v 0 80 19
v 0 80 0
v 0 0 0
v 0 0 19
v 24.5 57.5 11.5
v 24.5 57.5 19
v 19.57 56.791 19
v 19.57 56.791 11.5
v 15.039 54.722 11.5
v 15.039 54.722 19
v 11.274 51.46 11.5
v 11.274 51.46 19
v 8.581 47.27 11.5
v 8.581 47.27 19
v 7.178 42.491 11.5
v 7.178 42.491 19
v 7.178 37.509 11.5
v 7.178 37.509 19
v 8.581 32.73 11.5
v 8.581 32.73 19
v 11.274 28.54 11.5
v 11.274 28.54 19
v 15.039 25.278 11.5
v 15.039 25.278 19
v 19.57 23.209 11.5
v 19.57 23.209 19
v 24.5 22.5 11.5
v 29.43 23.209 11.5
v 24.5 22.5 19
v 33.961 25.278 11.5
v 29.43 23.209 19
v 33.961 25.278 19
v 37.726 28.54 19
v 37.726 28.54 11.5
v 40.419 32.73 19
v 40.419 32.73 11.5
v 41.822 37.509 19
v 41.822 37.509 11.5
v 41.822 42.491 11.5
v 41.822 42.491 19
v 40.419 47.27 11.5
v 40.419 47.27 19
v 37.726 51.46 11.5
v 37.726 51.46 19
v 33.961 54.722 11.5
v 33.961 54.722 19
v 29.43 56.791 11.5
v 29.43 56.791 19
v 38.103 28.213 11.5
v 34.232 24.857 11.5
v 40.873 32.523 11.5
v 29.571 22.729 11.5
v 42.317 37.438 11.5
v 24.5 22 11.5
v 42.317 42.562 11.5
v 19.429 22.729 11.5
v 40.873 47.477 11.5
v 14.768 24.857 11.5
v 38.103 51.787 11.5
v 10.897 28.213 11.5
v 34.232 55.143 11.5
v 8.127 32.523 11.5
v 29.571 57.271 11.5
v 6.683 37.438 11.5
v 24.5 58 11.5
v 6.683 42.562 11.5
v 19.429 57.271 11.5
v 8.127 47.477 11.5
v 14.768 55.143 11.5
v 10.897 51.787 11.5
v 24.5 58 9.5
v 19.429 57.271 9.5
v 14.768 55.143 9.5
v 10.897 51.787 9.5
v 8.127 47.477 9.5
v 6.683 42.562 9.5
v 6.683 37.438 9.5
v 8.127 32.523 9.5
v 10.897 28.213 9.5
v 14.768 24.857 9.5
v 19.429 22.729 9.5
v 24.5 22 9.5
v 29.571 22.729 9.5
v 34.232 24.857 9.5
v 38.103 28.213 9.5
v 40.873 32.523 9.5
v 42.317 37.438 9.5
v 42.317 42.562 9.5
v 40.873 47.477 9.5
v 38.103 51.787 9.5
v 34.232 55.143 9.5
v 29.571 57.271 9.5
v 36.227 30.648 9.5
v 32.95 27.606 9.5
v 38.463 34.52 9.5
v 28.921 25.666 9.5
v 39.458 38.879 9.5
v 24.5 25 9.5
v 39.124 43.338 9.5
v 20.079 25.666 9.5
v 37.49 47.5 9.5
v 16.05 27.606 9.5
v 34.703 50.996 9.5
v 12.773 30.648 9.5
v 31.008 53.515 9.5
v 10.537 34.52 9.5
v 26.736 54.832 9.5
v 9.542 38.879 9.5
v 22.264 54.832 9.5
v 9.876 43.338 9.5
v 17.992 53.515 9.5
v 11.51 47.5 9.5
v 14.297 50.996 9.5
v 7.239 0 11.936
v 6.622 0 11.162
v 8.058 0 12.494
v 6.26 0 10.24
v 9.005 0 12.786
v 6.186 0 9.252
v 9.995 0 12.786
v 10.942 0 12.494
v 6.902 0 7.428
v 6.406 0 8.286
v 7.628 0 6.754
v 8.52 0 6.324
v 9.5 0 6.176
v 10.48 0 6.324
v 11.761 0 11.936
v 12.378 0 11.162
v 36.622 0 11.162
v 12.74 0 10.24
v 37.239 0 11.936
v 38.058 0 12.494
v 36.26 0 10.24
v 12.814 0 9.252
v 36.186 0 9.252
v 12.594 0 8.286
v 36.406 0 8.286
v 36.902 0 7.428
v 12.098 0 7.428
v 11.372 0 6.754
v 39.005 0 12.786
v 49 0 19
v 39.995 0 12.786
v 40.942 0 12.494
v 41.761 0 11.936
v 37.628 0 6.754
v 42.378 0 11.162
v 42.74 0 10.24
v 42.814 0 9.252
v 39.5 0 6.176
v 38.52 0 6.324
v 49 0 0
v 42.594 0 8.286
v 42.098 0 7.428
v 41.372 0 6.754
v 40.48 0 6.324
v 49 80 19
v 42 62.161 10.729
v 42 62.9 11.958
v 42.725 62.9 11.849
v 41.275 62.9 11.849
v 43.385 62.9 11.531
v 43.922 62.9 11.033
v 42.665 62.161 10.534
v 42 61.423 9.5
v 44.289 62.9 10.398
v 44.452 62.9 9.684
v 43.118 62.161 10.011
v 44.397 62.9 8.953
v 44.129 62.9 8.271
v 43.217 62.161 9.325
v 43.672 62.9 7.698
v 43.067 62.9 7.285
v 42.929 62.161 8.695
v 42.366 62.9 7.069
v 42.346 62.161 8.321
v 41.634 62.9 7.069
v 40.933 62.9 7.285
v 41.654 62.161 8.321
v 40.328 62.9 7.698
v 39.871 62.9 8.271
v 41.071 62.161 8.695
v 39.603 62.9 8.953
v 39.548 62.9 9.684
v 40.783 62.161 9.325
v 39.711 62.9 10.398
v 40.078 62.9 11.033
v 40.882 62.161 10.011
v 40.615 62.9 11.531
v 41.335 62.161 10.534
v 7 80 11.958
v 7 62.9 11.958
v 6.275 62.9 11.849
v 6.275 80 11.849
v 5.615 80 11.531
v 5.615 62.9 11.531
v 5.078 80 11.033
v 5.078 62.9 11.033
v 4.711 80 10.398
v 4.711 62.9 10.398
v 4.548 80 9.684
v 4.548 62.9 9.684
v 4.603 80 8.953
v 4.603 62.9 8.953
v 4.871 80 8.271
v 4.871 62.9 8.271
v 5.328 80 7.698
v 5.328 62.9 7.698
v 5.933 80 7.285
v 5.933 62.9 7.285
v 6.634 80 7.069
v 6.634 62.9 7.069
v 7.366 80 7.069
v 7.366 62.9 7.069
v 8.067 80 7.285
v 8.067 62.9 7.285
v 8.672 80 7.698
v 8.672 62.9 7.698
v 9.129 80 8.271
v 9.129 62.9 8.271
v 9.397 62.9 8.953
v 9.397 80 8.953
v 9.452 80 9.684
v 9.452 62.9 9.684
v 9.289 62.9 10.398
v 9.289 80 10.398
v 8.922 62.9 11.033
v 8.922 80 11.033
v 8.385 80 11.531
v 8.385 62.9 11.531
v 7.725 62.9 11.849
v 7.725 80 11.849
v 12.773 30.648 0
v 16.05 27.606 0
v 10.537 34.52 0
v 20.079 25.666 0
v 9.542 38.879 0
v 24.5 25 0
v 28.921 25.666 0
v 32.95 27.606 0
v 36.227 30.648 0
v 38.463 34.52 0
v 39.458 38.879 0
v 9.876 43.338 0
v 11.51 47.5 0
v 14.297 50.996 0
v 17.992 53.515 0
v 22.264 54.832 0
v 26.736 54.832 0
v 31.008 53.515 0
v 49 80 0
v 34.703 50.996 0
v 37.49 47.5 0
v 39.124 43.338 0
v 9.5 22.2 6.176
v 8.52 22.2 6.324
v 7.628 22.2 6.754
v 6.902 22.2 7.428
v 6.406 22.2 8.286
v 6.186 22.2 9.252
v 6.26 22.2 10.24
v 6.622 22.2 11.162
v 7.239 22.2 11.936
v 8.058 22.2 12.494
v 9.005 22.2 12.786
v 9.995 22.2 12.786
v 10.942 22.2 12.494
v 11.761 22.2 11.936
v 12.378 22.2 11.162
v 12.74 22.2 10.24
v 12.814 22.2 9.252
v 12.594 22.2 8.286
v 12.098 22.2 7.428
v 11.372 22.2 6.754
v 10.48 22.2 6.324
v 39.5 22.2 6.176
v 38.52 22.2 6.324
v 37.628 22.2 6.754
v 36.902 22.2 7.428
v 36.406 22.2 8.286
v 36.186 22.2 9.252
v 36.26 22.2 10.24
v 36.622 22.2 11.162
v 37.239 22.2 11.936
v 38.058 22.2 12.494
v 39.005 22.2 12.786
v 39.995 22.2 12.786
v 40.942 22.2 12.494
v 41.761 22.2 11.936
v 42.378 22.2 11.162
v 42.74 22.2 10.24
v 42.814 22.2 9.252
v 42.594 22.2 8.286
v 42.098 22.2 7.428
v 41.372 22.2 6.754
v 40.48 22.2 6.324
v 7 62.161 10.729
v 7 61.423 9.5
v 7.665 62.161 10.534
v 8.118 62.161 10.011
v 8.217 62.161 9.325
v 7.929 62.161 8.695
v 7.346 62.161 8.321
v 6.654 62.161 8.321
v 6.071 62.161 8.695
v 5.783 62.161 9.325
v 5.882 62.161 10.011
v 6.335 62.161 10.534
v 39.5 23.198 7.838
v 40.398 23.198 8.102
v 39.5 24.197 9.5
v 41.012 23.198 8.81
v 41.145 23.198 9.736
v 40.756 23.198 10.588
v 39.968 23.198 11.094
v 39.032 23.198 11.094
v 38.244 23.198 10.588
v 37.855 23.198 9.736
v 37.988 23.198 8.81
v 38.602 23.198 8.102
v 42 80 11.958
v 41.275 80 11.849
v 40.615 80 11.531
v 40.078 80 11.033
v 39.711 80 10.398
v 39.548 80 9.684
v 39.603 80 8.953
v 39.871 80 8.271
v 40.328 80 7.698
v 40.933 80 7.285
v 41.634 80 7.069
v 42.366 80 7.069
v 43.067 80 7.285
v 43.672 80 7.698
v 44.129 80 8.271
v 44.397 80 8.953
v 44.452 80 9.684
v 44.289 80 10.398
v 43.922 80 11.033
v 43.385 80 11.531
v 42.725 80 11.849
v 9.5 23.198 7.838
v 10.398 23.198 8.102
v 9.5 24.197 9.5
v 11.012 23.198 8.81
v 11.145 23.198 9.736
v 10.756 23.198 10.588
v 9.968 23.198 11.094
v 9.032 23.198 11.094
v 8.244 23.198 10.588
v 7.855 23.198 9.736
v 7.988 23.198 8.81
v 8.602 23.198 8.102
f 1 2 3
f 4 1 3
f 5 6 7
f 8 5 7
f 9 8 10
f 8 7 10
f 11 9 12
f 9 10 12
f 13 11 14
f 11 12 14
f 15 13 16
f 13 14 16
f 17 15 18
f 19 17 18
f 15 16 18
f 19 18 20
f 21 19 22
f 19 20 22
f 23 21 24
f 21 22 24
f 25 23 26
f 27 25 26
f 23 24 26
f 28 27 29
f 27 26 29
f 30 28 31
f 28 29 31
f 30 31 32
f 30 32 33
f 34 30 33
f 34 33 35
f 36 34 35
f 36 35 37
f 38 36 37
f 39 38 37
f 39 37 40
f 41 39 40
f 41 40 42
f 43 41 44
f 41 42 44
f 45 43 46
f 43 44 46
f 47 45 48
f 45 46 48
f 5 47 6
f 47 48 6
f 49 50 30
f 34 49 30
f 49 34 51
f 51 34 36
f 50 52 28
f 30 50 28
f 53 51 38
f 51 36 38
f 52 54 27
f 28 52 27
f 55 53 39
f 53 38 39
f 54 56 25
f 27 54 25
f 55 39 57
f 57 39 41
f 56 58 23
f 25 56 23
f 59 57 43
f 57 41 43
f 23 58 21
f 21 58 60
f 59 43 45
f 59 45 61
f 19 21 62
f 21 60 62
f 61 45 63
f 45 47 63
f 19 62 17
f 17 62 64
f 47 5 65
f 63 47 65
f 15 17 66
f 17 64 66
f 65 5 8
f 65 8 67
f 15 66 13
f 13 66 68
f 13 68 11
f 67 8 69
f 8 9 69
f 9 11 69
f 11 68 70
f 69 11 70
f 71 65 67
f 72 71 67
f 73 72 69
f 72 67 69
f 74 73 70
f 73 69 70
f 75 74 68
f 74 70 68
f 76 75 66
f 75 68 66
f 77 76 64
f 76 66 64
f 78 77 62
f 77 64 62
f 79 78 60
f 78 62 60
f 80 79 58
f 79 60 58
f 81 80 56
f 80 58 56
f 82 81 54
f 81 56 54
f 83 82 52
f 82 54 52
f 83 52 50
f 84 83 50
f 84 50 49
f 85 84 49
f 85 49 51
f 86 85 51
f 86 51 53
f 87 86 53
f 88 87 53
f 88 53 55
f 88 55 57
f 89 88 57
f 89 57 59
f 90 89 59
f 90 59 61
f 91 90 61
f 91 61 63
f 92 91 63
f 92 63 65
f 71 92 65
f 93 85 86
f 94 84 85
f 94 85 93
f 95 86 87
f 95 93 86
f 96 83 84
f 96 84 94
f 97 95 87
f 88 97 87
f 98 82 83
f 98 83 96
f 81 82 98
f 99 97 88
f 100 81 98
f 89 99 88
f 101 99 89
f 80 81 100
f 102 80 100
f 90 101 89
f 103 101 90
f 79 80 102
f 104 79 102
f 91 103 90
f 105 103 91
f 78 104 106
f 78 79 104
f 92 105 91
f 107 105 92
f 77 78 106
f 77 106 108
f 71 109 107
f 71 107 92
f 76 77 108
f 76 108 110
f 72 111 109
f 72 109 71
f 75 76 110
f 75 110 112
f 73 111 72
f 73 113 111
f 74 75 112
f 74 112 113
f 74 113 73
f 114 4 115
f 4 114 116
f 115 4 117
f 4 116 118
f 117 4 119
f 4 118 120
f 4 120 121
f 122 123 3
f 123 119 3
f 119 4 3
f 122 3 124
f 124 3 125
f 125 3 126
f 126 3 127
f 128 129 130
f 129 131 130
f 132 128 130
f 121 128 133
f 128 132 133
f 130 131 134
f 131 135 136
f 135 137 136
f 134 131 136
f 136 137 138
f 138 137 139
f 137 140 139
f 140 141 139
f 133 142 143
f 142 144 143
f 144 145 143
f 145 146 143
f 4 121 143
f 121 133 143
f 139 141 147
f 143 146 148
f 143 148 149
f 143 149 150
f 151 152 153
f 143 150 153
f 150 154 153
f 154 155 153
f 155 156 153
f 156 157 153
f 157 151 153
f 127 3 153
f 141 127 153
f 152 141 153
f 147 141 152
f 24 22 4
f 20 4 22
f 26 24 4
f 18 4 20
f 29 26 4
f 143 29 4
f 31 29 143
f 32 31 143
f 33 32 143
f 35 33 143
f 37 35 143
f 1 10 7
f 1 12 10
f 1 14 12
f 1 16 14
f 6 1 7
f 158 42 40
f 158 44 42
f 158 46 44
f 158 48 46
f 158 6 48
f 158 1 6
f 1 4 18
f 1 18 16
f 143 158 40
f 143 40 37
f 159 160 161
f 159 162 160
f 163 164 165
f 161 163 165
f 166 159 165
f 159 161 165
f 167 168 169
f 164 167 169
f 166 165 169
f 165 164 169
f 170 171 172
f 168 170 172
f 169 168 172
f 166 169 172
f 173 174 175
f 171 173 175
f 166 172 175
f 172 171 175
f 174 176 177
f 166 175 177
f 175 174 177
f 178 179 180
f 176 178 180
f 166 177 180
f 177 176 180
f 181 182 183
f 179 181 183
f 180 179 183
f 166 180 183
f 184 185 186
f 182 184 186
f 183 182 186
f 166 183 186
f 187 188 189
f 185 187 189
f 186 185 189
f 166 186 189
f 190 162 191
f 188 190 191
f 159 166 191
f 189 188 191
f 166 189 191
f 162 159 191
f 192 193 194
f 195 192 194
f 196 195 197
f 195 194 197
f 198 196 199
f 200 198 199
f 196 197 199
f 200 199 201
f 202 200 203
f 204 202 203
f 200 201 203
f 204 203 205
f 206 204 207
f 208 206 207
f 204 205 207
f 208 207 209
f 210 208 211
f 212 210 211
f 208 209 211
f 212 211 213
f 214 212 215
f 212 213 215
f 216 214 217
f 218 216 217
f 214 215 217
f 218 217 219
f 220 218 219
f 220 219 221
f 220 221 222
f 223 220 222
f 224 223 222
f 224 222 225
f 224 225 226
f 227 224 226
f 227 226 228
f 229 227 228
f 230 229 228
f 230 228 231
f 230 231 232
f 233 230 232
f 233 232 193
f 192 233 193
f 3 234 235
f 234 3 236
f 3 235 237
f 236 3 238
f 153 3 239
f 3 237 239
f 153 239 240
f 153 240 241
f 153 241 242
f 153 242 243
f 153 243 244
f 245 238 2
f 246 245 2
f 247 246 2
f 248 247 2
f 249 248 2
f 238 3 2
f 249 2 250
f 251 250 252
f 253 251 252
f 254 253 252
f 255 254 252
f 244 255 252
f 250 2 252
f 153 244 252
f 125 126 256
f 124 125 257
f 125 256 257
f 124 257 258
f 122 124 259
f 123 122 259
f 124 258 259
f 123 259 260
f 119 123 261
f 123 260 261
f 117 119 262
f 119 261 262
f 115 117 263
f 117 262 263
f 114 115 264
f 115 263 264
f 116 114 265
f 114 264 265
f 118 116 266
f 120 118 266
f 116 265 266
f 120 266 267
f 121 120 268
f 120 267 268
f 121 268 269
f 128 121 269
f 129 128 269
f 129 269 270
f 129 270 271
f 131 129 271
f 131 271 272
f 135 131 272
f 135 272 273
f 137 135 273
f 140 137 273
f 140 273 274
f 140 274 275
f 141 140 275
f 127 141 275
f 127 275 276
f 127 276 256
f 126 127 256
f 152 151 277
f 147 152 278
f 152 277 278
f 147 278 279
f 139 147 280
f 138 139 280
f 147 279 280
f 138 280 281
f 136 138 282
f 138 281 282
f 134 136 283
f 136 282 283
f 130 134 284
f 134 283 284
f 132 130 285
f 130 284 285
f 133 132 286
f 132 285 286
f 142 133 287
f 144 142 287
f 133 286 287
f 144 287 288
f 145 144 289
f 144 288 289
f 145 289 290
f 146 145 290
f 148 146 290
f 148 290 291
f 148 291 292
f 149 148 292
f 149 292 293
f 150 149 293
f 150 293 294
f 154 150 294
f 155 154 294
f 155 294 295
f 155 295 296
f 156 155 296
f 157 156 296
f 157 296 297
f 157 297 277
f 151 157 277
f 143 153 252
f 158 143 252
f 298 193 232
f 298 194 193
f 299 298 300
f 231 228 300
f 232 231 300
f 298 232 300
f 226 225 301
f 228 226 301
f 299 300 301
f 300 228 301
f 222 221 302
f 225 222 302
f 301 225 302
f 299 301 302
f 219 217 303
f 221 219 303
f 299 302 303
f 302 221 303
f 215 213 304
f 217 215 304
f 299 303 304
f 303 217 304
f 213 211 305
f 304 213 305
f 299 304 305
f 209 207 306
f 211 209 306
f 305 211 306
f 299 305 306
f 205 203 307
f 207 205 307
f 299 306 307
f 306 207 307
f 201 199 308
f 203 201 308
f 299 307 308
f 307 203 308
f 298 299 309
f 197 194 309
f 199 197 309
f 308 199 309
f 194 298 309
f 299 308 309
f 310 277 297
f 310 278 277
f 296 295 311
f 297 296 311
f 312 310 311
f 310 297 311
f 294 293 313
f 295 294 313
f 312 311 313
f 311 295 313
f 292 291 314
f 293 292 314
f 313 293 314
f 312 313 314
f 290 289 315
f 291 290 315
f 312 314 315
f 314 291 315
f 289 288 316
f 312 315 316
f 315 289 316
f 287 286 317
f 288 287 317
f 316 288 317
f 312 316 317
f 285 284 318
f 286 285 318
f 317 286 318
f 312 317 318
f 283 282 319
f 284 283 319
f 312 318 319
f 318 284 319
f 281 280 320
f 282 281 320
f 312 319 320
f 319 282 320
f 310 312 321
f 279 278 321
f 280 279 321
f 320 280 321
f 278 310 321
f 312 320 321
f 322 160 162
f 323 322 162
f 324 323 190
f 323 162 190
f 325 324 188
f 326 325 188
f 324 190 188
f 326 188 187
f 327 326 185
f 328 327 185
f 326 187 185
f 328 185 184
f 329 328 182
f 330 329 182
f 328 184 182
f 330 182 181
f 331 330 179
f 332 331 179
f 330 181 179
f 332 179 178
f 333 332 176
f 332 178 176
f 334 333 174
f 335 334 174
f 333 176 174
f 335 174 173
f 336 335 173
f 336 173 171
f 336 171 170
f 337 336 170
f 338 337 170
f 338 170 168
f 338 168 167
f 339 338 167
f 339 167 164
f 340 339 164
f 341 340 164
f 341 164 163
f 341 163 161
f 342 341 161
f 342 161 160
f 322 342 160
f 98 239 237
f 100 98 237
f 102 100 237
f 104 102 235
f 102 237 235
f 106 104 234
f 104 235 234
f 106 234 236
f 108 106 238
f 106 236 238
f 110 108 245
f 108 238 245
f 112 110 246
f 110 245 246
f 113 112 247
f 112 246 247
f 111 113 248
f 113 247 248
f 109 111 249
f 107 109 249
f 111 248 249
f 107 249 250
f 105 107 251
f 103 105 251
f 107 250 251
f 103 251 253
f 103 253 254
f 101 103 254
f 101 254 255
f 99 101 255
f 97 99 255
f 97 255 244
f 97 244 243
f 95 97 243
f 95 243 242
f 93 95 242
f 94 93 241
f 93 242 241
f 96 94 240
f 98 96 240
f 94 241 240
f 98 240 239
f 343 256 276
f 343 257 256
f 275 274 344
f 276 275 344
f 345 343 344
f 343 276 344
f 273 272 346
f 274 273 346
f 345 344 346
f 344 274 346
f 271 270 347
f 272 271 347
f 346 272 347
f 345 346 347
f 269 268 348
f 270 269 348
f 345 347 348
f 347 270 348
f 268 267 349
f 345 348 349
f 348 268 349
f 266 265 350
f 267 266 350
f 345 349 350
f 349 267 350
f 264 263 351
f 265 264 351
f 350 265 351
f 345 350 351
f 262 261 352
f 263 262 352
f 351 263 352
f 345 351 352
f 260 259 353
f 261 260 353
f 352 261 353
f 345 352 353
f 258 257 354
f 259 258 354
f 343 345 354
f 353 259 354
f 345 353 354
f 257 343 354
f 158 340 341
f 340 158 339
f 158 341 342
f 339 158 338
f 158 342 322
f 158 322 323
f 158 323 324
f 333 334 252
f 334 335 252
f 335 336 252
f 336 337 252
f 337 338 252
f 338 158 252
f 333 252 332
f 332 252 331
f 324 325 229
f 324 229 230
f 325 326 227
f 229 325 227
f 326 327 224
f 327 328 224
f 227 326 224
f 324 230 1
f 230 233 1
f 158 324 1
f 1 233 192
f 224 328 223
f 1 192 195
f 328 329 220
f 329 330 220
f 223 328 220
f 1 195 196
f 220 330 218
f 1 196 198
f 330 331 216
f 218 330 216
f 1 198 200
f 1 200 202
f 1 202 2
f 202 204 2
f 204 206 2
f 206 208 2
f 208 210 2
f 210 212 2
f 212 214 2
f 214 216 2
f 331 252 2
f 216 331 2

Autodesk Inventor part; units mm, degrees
ref_plane "YZ Plane" through (0, 0, 0) normal (1, 0, 0) x (0, 1, 0)
ref_plane "XZ Plane" through (0, 0, 0) normal (0, 1, 0) x (-1, 0, 0)
sketch "Skizze1" plane through (0, 0, 0) normal (0, 0, 1) x (1, 0, 0)
  line L0 (0, 0) -> (49, 0)
  line L1 (49, 0) -> (49, 80)
  line L2 (49, 80) -> (0, 80)
  line L3 (0, 80) -> (0, 0)
  dimension "d0" = 49
  dimension "d1" = 80
extrude "Extrusion1" add sketch "Skizze1" along normal blind 19
sketch "Skizze2" plane through (0, 80, 0) normal (0, 1, 0) x (1, 0, 0)
  line L0 (0, 0) -> (0, -19) projected
  point P0 (7, -9.5)
  point P1 (0, -9.5)
  point P2 (42, -9.5)
  dimension "d11" = 7
  dimension "d12" = 35
hole "Bohrung1" at (7, 80, 9.5) at (42, 80, 9.5) direction (0, -1, 0) diameter 4.917 depth 17.1 tip angle 118 thread size "M6x1" class "6H" standard "ISO Metric profile"
sketch "Skizze3" plane through (0, 0, 0) normal (0, -1, 0) x (1, 0, 0)
  line L0 (0, 0) -> (0, 19) projected
  point P0 (9.5, 9.5)
  point P1 (0, 9.5)
  point P2 (0, 9.5)
  point P3 (0, 9.5)
  point P4 (39.5, 9.5)
  dimension "d20" = 9.5
  dimension "d21" = 30
hole "Bohrung2" at (9.5, 0, 9.5) at (39.5, 0, 9.5) direction (0, 1, 0) diameter 6.647 depth 22.2 tip angle 118 thread size "M8x1.25" class "6H" standard "ISO Metric profile"
ref_plane "Arbeitsebene1" through (0, 0, 9.5) normal (0, 0, 1) x (1, 0, 0)
sketch "Skizze6" plane through (0, 0, 9.5) normal (0, 0, 1) x (1, 0, 0)
  line L0 (49, 0) -> (49, 80) projected
  line L1 (49, 80) -> (0, 80) projected
  point P0 (0, 0)
  point P1 (24.5, 40)
  point P2 (49, 40)
  point P3 (24.5, 80)
hole "Bohrung4" at (24.5, 40, 9.5) direction (0, 0, 1) diameter 35 end through all counterbore diameter 36 counterbore depth 2
hole "Bohrung5" at (24.5, 40, 9.5) direction (0, 0, -1) diameter 30 end through all
properties part number "Lagerbock" material "Stahl, galvanisiert"
